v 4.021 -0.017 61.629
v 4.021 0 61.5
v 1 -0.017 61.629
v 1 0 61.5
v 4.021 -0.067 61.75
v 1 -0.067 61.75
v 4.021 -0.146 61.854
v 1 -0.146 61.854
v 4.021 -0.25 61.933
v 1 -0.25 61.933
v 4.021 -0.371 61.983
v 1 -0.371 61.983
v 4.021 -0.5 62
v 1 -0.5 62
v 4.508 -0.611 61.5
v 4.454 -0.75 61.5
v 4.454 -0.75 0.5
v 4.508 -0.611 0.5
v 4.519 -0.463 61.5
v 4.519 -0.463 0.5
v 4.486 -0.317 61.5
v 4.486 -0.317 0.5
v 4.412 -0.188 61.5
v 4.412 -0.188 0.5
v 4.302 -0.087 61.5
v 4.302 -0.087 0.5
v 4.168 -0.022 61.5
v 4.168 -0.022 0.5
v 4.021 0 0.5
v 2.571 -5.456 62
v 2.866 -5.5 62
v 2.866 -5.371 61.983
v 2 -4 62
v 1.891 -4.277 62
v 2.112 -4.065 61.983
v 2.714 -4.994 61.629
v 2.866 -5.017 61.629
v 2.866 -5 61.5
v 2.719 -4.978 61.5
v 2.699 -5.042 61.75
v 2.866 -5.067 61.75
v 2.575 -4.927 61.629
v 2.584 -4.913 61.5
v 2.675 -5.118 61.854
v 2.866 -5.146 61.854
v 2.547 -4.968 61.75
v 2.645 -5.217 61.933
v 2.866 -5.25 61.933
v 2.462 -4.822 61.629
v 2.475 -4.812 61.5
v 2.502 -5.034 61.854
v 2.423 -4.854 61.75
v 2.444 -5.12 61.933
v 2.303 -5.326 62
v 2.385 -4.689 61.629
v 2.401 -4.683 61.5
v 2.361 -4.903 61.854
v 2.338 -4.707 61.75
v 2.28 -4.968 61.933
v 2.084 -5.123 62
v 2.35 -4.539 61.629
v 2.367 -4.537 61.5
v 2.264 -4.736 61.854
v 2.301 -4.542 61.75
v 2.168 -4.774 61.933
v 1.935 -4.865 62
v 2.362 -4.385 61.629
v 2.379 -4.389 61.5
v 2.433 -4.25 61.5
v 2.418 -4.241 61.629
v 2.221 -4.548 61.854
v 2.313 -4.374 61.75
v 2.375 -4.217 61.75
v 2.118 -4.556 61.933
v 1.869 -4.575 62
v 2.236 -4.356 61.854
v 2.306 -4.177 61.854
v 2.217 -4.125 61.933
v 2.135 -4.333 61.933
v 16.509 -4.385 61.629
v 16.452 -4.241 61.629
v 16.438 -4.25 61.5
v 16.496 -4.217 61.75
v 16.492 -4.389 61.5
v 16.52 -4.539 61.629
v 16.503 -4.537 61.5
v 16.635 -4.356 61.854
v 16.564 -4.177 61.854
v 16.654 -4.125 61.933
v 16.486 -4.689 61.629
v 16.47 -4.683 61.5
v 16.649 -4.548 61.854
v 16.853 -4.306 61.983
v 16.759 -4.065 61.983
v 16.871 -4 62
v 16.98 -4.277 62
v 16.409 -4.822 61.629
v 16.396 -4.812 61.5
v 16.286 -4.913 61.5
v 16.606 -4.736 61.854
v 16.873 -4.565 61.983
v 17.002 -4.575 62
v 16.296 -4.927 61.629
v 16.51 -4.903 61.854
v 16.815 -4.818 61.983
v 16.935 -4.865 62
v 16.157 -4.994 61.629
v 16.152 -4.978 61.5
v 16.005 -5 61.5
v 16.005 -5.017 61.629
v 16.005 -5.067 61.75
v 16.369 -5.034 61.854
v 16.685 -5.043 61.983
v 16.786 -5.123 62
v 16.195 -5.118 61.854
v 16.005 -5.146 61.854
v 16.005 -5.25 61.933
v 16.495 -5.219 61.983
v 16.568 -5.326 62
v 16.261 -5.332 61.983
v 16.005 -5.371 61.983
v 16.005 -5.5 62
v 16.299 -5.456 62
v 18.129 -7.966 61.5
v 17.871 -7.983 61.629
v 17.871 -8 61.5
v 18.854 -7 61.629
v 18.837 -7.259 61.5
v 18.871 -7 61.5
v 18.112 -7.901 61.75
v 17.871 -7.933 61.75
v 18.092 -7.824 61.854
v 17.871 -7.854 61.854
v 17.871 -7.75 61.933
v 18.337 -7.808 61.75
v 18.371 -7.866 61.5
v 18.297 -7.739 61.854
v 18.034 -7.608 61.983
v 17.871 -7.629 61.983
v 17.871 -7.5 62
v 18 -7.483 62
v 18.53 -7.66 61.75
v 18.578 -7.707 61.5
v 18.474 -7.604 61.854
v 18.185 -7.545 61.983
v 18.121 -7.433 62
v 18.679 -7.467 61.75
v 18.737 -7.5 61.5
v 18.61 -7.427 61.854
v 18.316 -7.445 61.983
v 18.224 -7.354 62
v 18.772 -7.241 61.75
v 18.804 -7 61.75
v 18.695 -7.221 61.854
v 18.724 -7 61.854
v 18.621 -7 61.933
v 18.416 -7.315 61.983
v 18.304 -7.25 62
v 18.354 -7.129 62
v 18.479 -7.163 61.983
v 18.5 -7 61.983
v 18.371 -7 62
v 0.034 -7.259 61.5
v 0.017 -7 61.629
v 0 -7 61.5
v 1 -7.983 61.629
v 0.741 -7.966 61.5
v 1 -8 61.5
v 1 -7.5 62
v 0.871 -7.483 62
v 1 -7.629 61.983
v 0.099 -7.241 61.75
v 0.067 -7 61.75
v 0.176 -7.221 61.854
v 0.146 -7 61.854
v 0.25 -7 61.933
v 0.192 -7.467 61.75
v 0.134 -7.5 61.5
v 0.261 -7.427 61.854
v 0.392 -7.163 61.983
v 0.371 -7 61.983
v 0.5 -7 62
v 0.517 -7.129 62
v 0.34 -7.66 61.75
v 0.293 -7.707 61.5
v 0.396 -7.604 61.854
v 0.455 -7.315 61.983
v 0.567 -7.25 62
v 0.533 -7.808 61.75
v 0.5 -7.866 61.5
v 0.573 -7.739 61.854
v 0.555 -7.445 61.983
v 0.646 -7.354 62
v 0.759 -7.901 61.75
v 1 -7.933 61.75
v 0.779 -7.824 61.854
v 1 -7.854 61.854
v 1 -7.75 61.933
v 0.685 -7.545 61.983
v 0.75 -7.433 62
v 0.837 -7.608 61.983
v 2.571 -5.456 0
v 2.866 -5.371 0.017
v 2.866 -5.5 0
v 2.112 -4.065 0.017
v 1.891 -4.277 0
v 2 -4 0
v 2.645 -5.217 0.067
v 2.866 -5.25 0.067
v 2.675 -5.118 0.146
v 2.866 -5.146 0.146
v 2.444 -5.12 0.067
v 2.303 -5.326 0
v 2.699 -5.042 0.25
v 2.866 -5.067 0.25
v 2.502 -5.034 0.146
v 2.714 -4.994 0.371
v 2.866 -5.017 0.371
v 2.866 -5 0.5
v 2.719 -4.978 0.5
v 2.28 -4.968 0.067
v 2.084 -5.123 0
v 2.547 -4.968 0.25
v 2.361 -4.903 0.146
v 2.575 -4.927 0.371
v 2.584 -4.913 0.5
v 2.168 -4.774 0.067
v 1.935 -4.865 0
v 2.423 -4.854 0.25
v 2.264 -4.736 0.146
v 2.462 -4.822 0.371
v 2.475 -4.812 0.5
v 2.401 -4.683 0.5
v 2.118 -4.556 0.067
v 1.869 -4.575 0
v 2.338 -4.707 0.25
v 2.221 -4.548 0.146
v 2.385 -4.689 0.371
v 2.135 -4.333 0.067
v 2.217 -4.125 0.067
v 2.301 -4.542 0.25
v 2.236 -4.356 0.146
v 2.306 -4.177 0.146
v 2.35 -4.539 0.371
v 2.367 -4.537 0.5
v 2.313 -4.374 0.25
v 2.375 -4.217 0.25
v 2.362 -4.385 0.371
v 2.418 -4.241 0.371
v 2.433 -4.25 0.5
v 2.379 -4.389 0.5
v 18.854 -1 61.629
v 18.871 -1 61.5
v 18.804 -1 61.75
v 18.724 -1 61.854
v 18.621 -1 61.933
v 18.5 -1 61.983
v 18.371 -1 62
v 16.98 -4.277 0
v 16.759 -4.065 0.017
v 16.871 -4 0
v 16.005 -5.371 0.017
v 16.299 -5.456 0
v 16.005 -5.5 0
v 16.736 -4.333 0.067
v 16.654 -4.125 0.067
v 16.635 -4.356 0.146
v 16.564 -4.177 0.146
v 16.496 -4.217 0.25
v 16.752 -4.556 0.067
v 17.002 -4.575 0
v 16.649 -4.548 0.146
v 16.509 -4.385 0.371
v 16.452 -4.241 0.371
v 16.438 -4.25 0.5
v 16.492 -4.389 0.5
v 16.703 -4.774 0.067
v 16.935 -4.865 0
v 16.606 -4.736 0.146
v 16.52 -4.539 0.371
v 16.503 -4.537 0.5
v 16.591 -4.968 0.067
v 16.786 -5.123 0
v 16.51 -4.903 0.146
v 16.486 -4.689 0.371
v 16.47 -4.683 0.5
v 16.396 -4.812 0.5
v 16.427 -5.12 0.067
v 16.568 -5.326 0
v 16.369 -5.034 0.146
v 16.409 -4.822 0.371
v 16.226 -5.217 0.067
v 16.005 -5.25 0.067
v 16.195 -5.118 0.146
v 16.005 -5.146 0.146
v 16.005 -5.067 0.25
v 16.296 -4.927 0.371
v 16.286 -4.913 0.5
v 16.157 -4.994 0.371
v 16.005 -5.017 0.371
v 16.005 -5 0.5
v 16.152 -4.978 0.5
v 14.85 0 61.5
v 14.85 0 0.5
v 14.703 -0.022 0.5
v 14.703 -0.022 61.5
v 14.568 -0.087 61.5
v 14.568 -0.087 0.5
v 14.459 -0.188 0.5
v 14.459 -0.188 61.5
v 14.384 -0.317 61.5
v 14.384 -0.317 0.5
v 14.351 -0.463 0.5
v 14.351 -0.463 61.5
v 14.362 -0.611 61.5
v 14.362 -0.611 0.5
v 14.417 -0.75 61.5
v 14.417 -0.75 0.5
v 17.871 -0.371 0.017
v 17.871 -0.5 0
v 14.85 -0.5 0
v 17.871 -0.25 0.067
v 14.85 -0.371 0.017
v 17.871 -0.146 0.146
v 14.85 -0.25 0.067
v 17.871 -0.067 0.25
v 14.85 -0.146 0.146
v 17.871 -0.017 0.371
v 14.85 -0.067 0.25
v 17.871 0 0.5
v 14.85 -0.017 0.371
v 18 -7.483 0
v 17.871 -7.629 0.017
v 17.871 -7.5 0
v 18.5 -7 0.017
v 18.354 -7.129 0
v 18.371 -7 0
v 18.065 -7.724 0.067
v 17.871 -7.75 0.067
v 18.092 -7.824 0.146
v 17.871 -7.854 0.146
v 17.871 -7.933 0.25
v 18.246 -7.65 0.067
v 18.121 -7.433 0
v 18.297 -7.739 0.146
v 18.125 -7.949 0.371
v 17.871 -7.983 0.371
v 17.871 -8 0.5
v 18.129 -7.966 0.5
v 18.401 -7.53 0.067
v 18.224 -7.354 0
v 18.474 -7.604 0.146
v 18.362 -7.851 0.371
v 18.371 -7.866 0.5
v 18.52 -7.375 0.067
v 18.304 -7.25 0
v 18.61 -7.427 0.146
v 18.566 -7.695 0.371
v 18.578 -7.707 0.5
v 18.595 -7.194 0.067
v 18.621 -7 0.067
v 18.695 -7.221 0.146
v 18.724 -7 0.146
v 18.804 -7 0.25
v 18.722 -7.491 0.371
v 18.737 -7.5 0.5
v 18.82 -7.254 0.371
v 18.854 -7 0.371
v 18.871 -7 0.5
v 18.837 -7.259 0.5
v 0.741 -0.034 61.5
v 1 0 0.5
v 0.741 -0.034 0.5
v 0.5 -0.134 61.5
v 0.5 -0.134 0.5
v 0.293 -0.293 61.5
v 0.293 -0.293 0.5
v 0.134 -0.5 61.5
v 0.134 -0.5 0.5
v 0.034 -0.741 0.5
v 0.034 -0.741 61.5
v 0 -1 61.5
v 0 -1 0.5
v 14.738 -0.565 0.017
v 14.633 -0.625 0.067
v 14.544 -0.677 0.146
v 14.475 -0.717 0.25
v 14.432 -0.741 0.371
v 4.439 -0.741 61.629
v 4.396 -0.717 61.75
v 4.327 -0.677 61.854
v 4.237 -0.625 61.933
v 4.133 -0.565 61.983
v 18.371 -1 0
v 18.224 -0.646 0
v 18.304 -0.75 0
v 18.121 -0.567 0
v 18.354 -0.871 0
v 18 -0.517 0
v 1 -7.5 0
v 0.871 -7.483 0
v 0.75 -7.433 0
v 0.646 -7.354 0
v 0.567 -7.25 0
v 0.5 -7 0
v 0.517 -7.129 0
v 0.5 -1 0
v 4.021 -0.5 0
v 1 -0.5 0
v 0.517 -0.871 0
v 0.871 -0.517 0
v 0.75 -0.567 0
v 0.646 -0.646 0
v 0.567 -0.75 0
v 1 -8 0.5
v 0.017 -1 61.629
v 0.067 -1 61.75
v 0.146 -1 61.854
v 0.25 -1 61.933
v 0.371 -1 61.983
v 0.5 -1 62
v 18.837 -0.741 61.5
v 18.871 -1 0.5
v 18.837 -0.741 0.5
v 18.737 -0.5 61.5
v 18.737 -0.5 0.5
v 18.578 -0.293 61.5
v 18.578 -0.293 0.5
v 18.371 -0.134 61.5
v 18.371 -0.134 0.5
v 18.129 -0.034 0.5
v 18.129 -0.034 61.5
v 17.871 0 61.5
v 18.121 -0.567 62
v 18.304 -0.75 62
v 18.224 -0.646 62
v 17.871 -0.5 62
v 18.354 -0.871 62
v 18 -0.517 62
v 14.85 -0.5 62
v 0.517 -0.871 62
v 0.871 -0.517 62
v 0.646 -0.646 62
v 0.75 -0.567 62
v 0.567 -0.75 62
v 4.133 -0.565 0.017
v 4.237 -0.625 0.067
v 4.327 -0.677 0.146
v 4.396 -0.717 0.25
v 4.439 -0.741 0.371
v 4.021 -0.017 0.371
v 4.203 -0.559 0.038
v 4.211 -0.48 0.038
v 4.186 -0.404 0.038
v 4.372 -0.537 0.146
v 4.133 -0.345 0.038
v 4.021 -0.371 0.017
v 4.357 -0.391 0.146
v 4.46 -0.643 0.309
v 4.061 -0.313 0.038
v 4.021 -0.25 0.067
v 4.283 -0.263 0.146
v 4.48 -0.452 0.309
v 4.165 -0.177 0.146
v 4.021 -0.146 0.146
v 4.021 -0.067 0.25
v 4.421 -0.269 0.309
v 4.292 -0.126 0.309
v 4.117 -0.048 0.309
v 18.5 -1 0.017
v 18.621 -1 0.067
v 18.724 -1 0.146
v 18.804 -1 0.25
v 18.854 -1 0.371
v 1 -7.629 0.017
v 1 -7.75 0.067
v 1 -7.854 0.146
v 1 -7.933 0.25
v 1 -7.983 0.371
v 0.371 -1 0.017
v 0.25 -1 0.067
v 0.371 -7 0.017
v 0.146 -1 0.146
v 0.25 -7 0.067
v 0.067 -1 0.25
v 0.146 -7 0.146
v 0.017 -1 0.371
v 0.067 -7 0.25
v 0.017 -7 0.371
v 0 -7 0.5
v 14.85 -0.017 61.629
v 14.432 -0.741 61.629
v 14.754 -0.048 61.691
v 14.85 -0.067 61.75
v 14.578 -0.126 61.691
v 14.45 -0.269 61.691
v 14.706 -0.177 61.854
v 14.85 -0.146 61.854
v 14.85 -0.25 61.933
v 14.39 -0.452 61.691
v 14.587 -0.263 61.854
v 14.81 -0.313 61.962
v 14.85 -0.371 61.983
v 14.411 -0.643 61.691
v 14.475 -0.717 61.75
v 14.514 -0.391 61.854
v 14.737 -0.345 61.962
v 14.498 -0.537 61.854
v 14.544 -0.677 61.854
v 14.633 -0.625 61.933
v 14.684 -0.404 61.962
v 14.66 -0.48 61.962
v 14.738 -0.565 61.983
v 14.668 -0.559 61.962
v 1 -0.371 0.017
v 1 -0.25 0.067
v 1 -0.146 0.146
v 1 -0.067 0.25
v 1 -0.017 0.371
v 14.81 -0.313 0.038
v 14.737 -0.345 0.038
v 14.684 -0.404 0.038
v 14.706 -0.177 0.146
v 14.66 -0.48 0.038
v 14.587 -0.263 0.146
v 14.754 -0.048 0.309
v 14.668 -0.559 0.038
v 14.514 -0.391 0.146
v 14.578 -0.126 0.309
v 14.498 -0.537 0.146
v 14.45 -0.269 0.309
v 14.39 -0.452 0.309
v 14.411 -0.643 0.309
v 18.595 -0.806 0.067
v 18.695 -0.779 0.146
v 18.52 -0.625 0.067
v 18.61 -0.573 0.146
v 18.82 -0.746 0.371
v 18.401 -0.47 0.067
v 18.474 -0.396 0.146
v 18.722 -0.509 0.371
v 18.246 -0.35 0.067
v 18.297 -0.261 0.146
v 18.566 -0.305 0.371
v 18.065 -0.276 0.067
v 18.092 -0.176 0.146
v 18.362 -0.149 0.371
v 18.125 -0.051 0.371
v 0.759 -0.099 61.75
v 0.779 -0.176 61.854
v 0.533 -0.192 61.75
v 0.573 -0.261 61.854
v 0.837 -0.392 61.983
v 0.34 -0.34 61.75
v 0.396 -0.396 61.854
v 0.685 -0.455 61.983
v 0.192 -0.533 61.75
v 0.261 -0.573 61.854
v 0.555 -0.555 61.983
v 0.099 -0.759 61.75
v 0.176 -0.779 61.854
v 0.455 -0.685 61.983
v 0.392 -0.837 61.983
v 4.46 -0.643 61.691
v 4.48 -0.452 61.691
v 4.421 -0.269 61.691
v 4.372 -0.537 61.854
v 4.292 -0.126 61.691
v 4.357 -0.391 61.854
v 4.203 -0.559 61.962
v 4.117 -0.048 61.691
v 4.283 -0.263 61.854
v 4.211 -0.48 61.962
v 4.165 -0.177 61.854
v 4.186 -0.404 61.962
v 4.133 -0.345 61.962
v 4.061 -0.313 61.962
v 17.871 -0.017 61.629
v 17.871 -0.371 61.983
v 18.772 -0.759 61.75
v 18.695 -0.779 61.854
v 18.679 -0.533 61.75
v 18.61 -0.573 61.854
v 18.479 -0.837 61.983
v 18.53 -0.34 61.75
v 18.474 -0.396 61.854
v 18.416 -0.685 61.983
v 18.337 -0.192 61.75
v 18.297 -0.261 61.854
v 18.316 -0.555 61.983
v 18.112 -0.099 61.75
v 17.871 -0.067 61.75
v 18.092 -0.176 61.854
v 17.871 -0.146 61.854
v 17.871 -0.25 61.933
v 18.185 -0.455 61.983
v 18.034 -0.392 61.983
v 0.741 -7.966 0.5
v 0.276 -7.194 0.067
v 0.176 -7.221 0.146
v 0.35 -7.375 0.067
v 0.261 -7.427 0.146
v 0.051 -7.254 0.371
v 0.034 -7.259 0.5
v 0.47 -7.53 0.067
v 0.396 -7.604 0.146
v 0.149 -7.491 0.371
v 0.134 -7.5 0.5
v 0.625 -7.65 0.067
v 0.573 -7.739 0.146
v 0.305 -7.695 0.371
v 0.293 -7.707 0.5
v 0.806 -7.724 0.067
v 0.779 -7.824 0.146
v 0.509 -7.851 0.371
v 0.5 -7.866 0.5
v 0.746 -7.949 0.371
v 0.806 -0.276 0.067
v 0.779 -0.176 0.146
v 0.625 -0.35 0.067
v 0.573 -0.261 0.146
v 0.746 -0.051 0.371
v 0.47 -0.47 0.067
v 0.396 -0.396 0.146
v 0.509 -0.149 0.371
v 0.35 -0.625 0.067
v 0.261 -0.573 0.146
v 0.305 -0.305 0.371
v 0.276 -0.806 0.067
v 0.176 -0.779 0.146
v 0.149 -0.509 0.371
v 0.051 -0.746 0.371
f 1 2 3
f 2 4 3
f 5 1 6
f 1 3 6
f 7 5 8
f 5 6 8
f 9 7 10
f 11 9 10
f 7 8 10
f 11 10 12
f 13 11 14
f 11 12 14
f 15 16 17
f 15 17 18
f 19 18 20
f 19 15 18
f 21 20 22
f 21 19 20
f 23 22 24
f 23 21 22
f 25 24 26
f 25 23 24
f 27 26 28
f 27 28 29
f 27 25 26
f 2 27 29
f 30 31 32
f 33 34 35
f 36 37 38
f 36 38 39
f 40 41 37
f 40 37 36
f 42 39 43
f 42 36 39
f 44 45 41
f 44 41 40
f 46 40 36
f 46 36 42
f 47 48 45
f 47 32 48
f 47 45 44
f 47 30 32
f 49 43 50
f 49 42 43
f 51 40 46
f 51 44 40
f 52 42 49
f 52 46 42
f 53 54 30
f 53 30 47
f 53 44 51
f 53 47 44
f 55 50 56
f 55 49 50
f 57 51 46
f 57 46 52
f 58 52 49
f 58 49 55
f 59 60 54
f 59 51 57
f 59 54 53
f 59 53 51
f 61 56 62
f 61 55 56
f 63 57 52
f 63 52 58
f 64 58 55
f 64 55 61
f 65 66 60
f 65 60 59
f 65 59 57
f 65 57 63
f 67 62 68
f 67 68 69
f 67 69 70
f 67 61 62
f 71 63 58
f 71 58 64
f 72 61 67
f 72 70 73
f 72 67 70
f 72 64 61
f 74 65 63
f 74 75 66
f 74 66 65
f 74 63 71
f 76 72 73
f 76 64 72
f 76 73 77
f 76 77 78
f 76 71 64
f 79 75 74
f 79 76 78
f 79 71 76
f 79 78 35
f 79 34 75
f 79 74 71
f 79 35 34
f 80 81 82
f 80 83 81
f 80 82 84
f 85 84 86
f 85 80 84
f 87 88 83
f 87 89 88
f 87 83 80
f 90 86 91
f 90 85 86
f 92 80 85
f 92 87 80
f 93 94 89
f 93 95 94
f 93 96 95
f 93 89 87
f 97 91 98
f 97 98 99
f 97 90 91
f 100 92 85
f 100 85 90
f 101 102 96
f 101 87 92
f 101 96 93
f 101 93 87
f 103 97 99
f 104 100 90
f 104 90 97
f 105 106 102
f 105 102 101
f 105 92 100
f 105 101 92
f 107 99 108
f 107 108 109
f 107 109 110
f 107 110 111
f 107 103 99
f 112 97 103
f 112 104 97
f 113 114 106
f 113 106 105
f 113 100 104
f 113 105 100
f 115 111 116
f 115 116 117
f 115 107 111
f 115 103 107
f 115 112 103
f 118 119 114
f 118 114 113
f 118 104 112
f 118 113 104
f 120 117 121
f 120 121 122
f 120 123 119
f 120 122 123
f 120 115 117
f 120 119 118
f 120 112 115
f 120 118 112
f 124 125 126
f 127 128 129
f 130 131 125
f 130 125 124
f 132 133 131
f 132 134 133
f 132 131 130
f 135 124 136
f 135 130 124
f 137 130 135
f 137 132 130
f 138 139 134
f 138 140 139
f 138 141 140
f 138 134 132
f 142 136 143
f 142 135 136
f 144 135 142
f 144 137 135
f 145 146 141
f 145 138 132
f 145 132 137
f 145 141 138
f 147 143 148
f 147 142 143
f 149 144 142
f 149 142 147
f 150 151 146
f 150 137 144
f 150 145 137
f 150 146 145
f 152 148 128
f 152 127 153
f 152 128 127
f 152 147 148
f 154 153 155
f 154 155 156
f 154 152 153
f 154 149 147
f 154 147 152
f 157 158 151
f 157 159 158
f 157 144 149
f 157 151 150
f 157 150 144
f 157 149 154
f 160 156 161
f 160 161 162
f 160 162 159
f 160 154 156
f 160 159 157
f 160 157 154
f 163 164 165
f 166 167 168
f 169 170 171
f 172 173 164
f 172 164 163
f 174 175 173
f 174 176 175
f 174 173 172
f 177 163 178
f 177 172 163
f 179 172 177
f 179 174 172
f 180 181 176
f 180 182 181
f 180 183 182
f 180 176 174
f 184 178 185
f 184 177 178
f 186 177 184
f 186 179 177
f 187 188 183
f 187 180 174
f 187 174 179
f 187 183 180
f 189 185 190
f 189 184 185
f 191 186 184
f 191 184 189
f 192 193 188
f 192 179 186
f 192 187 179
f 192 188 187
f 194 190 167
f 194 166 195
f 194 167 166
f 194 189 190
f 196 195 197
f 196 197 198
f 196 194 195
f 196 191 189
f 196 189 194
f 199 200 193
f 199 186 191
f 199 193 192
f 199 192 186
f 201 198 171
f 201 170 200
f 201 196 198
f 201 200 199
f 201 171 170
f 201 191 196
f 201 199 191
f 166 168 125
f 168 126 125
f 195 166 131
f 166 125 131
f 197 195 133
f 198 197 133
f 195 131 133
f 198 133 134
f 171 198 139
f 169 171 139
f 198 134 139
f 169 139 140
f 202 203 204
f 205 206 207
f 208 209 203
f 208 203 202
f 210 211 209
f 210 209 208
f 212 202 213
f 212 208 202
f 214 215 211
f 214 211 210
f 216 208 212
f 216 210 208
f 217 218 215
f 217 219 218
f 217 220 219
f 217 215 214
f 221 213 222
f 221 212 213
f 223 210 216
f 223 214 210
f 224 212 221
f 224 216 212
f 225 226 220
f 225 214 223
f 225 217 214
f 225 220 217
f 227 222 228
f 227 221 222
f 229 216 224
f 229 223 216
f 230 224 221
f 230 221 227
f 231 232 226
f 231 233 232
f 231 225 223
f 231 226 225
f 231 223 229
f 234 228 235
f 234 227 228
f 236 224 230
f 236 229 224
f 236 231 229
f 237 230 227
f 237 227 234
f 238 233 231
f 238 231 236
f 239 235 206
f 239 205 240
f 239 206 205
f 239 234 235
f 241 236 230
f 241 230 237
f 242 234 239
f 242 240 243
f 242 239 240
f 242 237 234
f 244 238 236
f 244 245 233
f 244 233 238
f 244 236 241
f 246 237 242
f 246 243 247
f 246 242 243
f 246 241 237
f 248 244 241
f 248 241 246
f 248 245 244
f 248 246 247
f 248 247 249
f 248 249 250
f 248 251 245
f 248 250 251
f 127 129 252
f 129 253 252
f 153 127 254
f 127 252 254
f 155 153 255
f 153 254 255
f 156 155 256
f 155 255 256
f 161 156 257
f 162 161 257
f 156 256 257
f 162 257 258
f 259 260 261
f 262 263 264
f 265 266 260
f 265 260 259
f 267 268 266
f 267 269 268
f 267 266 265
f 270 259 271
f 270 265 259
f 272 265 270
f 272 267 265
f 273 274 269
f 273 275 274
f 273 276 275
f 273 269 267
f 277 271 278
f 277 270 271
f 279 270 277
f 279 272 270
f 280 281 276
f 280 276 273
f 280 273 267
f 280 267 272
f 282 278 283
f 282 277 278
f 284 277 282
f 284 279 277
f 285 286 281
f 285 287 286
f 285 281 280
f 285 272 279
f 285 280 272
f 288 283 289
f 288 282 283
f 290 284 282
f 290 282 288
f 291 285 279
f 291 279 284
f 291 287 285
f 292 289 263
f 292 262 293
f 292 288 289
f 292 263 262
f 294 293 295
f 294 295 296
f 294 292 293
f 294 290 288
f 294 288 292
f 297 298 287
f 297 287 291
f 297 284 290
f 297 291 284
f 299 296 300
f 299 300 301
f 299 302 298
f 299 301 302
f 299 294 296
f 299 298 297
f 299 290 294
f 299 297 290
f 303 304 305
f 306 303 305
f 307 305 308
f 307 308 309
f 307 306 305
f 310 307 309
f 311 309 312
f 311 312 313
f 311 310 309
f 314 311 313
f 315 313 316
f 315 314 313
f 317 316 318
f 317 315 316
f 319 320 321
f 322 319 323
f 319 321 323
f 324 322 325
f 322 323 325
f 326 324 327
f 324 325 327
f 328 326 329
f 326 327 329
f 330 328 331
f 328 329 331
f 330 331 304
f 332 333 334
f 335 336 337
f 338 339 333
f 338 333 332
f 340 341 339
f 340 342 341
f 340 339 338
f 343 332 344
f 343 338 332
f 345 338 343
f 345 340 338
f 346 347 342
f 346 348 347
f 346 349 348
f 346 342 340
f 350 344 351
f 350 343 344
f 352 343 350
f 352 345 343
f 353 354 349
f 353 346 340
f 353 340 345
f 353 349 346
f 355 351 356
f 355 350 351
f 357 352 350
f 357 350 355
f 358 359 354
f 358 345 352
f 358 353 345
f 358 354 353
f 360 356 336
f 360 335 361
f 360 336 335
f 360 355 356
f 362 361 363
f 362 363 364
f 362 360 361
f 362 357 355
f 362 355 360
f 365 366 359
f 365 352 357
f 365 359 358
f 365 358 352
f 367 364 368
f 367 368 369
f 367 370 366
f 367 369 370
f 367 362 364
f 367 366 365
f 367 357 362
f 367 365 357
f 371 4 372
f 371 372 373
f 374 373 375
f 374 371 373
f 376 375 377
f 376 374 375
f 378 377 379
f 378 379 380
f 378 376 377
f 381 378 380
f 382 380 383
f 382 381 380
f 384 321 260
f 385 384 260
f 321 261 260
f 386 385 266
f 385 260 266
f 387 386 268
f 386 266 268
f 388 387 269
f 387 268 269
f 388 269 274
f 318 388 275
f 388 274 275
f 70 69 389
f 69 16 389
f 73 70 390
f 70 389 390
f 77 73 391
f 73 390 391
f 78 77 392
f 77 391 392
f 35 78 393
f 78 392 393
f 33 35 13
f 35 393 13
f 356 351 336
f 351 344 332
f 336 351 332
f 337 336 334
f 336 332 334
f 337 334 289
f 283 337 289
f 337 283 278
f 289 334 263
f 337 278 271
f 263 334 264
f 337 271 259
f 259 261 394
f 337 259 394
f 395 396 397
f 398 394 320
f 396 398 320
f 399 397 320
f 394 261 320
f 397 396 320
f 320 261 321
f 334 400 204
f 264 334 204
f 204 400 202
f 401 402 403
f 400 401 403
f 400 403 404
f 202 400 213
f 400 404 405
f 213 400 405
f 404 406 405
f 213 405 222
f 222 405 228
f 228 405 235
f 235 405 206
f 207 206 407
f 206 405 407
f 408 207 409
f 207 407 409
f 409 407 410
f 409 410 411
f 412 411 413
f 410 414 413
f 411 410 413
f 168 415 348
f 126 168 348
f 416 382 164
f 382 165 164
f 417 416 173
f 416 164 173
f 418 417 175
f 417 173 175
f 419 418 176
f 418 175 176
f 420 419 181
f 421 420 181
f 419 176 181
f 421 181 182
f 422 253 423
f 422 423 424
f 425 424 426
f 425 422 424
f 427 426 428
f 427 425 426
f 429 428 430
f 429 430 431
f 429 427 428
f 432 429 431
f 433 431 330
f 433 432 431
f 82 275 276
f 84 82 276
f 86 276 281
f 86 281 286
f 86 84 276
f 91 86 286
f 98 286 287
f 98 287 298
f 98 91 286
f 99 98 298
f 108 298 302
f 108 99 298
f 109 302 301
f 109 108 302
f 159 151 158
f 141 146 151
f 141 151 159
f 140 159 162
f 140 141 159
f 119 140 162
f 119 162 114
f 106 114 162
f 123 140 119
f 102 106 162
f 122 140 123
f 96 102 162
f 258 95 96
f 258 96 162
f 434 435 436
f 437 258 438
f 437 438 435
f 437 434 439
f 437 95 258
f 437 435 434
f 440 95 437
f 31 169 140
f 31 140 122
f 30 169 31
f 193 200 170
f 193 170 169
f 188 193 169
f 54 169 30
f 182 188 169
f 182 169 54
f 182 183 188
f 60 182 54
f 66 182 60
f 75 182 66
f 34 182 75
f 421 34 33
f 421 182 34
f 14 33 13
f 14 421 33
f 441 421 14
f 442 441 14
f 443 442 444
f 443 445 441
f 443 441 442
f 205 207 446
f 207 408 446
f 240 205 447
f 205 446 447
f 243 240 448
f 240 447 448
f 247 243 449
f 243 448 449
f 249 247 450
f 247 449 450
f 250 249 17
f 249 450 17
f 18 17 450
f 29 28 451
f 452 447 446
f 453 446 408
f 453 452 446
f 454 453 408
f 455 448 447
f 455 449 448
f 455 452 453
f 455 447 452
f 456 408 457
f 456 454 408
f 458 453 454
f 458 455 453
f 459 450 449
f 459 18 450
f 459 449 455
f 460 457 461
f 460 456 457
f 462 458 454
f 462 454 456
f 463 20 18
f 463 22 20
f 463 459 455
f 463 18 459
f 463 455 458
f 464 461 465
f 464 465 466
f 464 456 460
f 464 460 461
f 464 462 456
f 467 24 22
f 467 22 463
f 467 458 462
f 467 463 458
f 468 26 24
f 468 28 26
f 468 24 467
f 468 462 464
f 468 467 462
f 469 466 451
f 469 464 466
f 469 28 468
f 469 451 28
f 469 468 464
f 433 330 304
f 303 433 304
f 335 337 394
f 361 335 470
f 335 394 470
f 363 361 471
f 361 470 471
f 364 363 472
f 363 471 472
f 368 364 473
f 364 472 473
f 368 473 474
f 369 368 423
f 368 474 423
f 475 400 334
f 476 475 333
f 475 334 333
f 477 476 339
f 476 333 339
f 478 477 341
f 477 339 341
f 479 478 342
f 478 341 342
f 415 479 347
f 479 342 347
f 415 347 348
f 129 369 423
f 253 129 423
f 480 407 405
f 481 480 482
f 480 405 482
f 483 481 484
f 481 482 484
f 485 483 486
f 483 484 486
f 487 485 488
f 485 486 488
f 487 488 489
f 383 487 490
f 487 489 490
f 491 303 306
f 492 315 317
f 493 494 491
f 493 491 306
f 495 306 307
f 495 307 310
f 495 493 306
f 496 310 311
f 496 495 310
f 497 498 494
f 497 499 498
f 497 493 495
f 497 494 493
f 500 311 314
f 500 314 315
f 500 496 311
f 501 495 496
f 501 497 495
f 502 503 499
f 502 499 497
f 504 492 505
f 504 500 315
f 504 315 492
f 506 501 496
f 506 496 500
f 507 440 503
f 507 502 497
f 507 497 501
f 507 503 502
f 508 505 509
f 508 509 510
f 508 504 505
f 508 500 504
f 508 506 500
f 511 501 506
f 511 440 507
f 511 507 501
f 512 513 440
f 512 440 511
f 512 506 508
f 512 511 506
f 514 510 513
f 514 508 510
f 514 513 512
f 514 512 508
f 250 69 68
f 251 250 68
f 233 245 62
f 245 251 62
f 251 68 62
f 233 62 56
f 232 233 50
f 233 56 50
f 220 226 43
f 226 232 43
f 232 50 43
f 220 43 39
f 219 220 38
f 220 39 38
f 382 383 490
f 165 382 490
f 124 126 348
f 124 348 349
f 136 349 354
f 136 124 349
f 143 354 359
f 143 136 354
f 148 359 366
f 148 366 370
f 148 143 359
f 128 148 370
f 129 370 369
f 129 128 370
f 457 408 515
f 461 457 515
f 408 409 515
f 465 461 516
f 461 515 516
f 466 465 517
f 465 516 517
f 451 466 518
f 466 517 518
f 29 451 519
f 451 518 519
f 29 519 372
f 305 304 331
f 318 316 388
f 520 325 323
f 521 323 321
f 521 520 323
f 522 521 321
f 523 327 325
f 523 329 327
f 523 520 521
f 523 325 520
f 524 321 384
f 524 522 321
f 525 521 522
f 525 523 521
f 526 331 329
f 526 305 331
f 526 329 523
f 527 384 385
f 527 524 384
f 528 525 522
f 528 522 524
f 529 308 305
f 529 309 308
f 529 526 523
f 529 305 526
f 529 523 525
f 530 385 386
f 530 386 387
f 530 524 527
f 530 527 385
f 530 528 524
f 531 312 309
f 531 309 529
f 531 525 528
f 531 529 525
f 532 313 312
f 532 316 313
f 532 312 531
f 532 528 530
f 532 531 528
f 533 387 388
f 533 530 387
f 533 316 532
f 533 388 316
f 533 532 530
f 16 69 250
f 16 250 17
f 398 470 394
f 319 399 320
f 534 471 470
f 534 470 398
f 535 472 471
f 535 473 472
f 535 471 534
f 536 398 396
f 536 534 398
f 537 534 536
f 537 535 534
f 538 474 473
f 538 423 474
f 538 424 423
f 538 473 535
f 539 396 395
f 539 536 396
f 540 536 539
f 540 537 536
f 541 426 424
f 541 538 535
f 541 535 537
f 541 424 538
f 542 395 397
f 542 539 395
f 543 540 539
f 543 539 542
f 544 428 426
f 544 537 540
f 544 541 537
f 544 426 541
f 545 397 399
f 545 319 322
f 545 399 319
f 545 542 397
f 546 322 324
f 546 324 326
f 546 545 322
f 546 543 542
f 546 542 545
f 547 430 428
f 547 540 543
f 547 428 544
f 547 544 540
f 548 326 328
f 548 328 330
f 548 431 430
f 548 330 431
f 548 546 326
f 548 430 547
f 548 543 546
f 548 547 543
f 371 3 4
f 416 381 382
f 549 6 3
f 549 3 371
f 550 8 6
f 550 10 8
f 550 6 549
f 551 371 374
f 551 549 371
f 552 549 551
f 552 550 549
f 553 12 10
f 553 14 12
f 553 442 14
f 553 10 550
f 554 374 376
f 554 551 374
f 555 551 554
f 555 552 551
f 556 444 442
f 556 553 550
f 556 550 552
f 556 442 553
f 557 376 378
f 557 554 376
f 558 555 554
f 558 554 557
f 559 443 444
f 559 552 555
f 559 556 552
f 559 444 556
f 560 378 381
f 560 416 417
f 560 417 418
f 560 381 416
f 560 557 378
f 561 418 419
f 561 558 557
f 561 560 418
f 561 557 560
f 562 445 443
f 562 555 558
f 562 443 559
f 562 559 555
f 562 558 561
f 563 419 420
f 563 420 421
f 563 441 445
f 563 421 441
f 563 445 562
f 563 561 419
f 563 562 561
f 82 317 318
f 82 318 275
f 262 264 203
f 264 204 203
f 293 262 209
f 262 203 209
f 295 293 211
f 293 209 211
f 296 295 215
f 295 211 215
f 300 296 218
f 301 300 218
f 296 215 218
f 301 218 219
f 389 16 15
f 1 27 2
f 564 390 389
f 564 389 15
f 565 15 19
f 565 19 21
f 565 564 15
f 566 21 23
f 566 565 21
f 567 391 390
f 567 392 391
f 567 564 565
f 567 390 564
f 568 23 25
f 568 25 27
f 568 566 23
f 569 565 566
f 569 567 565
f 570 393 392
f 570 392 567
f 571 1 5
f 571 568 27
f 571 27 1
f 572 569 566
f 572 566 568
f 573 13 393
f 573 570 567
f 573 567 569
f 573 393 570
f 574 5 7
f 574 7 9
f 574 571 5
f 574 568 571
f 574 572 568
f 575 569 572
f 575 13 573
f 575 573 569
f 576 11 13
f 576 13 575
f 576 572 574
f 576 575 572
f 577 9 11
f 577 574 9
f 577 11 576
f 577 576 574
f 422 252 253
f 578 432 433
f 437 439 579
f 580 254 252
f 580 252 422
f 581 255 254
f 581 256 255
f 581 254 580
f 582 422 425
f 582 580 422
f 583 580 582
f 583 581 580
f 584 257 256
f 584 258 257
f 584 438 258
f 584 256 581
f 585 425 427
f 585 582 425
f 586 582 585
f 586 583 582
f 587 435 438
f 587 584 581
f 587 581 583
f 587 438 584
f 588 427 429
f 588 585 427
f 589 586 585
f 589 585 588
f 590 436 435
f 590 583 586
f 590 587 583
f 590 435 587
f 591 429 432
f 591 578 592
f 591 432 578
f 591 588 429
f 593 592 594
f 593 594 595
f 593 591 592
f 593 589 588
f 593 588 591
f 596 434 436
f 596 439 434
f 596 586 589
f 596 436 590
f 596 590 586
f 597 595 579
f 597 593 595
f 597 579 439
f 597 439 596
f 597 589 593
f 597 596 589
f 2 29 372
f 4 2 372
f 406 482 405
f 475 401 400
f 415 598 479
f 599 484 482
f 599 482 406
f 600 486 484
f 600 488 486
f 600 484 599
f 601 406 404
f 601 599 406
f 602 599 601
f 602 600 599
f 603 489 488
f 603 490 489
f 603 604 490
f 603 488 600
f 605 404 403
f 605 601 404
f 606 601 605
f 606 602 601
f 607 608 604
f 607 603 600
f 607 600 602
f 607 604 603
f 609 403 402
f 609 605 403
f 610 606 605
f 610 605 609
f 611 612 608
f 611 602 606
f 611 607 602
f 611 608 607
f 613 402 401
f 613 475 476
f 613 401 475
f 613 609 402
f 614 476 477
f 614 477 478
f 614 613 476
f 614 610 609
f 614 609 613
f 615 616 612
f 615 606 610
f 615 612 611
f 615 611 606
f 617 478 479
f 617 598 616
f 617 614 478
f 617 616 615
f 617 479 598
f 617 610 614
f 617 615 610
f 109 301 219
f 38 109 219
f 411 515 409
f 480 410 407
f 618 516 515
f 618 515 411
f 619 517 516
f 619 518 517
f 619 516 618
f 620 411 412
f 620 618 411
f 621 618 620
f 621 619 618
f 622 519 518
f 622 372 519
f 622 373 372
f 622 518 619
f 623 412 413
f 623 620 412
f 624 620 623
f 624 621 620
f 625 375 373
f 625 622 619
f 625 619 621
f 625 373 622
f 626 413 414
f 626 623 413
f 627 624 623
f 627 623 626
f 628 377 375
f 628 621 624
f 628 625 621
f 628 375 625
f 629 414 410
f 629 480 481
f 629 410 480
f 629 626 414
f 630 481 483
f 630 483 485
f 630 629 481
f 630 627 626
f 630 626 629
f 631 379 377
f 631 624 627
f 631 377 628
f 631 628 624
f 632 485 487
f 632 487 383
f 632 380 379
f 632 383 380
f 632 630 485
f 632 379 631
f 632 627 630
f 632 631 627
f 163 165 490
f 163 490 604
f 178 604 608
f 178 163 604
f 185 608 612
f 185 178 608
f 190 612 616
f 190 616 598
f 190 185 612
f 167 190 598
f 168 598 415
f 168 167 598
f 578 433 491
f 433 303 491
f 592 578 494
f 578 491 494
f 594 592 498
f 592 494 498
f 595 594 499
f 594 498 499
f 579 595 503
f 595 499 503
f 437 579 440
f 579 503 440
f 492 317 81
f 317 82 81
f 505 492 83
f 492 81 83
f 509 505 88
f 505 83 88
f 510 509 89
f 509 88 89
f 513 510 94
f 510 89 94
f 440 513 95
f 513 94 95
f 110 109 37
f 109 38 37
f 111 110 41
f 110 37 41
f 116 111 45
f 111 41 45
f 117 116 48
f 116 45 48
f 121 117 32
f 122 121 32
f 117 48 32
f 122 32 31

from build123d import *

# Parameters (mm, degrees)
SKETCH1_W           = 5
SKETCH1_H           = 2
BOSS_EXTRUDE1_DEPTH = 62
FILLET1_R           = 0.5
FILLET2_R           = 1
FILLET3_R           = 0.5


with BuildPart() as part:
    # Sketch1 → Boss-Extrude1 (new body)
    with BuildSketch(Plane(origin=(0, 0, 0), x_dir=(0, 1, 0), z_dir=(0, 0, 1))):
        with Locations((-2.5, -1)):
            Rectangle(SKETCH1_W, SKETCH1_H)
        Polygon((0, -4.886751346), (0, -2), (-5, -2), align=None)
        Polygon((-5, -16.87062059), (-5, -2), (-5, 0), (-8, 0), (-8, -18.87062059), (-5, -18.87062059), align=None)
        Polygon((0, -13.983869244), (-5, -16.87062059), (0, -16.87062059), align=None)
        with Locations((-2.5, -17.87062059)):
            Rectangle(SKETCH1_W, SKETCH1_H)
    extrude(amount=BOSS_EXTRUDE1_DEPTH)

    # Fillet1
    fillet1_edges = [part.edges().sort_by_distance(p)[0] for p in [
        (4.886751346, 0, 31),
        (2, -5, 31),
        (16.87062059, -5, 31),
        (13.983869244, 0, 31),
    ]]
    fillet(fillet1_edges, radius=FILLET1_R)

    # Fillet2
    fillet2_edges = [part.edges().sort_by_distance(p)[0] for p in [
        (18.87062059, 0, 31),
        (18.87062059, -8, 31),
        (0, -8, 31),
        (0, 0, 31),
    ]]
    fillet(fillet2_edges, radius=FILLET2_R)

    # Fillet3
    fillet3_edges = [part.edges().sort_by_distance(p)[0] for p in [
        (9.435310295, -5, 0),
        (9.435310295, -5, 62),
        (15.427244917, -2.5, 0),
        (15.427244917, -2.5, 62),
        (3.443375673, -2.5, 0),
        (3.443375673, -2.5, 62),
        (4.453738644, -0.25, 0),
        (14.416881946, -0.25, 0),
        (4.453738644, -0.25, 62),
        (14.416881946, -0.25, 62),
        (16.437607888, -4.75, 0),
        (16.437607888, -4.75, 62),
        (2.433012702, -4.75, 0),
        (2.433012702, -4.75, 62),
        (16.360257619, 0, 0),
        (16.360257619, 0, 62),
        (18.87062059, -4, 0),
        (9.435310295, -8, 0),
        (0, -4, 0),
        (2.510362971, 0, 0),
        (0.292893219, -0.292893219, 0),
        (0.292893219, -7.707106781, 0),
        (18.577727371, -7.707106781, 0),
        (18.577727371, -0.292893219, 0),
        (18.87062059, -4, 62),
        (2.510362971, 0, 62),
        (0, -4, 62),
        (9.435310295, -8, 62),
        (0.292893219, -0.292893219, 62),
        (0.292893219, -7.707106781, 62),
        (18.577727371, -7.707106781, 62),
        (18.577727371, -0.292893219, 62),
    ]]
    fillet(fillet3_edges, radius=FILLET3_R)


solid = part.part
